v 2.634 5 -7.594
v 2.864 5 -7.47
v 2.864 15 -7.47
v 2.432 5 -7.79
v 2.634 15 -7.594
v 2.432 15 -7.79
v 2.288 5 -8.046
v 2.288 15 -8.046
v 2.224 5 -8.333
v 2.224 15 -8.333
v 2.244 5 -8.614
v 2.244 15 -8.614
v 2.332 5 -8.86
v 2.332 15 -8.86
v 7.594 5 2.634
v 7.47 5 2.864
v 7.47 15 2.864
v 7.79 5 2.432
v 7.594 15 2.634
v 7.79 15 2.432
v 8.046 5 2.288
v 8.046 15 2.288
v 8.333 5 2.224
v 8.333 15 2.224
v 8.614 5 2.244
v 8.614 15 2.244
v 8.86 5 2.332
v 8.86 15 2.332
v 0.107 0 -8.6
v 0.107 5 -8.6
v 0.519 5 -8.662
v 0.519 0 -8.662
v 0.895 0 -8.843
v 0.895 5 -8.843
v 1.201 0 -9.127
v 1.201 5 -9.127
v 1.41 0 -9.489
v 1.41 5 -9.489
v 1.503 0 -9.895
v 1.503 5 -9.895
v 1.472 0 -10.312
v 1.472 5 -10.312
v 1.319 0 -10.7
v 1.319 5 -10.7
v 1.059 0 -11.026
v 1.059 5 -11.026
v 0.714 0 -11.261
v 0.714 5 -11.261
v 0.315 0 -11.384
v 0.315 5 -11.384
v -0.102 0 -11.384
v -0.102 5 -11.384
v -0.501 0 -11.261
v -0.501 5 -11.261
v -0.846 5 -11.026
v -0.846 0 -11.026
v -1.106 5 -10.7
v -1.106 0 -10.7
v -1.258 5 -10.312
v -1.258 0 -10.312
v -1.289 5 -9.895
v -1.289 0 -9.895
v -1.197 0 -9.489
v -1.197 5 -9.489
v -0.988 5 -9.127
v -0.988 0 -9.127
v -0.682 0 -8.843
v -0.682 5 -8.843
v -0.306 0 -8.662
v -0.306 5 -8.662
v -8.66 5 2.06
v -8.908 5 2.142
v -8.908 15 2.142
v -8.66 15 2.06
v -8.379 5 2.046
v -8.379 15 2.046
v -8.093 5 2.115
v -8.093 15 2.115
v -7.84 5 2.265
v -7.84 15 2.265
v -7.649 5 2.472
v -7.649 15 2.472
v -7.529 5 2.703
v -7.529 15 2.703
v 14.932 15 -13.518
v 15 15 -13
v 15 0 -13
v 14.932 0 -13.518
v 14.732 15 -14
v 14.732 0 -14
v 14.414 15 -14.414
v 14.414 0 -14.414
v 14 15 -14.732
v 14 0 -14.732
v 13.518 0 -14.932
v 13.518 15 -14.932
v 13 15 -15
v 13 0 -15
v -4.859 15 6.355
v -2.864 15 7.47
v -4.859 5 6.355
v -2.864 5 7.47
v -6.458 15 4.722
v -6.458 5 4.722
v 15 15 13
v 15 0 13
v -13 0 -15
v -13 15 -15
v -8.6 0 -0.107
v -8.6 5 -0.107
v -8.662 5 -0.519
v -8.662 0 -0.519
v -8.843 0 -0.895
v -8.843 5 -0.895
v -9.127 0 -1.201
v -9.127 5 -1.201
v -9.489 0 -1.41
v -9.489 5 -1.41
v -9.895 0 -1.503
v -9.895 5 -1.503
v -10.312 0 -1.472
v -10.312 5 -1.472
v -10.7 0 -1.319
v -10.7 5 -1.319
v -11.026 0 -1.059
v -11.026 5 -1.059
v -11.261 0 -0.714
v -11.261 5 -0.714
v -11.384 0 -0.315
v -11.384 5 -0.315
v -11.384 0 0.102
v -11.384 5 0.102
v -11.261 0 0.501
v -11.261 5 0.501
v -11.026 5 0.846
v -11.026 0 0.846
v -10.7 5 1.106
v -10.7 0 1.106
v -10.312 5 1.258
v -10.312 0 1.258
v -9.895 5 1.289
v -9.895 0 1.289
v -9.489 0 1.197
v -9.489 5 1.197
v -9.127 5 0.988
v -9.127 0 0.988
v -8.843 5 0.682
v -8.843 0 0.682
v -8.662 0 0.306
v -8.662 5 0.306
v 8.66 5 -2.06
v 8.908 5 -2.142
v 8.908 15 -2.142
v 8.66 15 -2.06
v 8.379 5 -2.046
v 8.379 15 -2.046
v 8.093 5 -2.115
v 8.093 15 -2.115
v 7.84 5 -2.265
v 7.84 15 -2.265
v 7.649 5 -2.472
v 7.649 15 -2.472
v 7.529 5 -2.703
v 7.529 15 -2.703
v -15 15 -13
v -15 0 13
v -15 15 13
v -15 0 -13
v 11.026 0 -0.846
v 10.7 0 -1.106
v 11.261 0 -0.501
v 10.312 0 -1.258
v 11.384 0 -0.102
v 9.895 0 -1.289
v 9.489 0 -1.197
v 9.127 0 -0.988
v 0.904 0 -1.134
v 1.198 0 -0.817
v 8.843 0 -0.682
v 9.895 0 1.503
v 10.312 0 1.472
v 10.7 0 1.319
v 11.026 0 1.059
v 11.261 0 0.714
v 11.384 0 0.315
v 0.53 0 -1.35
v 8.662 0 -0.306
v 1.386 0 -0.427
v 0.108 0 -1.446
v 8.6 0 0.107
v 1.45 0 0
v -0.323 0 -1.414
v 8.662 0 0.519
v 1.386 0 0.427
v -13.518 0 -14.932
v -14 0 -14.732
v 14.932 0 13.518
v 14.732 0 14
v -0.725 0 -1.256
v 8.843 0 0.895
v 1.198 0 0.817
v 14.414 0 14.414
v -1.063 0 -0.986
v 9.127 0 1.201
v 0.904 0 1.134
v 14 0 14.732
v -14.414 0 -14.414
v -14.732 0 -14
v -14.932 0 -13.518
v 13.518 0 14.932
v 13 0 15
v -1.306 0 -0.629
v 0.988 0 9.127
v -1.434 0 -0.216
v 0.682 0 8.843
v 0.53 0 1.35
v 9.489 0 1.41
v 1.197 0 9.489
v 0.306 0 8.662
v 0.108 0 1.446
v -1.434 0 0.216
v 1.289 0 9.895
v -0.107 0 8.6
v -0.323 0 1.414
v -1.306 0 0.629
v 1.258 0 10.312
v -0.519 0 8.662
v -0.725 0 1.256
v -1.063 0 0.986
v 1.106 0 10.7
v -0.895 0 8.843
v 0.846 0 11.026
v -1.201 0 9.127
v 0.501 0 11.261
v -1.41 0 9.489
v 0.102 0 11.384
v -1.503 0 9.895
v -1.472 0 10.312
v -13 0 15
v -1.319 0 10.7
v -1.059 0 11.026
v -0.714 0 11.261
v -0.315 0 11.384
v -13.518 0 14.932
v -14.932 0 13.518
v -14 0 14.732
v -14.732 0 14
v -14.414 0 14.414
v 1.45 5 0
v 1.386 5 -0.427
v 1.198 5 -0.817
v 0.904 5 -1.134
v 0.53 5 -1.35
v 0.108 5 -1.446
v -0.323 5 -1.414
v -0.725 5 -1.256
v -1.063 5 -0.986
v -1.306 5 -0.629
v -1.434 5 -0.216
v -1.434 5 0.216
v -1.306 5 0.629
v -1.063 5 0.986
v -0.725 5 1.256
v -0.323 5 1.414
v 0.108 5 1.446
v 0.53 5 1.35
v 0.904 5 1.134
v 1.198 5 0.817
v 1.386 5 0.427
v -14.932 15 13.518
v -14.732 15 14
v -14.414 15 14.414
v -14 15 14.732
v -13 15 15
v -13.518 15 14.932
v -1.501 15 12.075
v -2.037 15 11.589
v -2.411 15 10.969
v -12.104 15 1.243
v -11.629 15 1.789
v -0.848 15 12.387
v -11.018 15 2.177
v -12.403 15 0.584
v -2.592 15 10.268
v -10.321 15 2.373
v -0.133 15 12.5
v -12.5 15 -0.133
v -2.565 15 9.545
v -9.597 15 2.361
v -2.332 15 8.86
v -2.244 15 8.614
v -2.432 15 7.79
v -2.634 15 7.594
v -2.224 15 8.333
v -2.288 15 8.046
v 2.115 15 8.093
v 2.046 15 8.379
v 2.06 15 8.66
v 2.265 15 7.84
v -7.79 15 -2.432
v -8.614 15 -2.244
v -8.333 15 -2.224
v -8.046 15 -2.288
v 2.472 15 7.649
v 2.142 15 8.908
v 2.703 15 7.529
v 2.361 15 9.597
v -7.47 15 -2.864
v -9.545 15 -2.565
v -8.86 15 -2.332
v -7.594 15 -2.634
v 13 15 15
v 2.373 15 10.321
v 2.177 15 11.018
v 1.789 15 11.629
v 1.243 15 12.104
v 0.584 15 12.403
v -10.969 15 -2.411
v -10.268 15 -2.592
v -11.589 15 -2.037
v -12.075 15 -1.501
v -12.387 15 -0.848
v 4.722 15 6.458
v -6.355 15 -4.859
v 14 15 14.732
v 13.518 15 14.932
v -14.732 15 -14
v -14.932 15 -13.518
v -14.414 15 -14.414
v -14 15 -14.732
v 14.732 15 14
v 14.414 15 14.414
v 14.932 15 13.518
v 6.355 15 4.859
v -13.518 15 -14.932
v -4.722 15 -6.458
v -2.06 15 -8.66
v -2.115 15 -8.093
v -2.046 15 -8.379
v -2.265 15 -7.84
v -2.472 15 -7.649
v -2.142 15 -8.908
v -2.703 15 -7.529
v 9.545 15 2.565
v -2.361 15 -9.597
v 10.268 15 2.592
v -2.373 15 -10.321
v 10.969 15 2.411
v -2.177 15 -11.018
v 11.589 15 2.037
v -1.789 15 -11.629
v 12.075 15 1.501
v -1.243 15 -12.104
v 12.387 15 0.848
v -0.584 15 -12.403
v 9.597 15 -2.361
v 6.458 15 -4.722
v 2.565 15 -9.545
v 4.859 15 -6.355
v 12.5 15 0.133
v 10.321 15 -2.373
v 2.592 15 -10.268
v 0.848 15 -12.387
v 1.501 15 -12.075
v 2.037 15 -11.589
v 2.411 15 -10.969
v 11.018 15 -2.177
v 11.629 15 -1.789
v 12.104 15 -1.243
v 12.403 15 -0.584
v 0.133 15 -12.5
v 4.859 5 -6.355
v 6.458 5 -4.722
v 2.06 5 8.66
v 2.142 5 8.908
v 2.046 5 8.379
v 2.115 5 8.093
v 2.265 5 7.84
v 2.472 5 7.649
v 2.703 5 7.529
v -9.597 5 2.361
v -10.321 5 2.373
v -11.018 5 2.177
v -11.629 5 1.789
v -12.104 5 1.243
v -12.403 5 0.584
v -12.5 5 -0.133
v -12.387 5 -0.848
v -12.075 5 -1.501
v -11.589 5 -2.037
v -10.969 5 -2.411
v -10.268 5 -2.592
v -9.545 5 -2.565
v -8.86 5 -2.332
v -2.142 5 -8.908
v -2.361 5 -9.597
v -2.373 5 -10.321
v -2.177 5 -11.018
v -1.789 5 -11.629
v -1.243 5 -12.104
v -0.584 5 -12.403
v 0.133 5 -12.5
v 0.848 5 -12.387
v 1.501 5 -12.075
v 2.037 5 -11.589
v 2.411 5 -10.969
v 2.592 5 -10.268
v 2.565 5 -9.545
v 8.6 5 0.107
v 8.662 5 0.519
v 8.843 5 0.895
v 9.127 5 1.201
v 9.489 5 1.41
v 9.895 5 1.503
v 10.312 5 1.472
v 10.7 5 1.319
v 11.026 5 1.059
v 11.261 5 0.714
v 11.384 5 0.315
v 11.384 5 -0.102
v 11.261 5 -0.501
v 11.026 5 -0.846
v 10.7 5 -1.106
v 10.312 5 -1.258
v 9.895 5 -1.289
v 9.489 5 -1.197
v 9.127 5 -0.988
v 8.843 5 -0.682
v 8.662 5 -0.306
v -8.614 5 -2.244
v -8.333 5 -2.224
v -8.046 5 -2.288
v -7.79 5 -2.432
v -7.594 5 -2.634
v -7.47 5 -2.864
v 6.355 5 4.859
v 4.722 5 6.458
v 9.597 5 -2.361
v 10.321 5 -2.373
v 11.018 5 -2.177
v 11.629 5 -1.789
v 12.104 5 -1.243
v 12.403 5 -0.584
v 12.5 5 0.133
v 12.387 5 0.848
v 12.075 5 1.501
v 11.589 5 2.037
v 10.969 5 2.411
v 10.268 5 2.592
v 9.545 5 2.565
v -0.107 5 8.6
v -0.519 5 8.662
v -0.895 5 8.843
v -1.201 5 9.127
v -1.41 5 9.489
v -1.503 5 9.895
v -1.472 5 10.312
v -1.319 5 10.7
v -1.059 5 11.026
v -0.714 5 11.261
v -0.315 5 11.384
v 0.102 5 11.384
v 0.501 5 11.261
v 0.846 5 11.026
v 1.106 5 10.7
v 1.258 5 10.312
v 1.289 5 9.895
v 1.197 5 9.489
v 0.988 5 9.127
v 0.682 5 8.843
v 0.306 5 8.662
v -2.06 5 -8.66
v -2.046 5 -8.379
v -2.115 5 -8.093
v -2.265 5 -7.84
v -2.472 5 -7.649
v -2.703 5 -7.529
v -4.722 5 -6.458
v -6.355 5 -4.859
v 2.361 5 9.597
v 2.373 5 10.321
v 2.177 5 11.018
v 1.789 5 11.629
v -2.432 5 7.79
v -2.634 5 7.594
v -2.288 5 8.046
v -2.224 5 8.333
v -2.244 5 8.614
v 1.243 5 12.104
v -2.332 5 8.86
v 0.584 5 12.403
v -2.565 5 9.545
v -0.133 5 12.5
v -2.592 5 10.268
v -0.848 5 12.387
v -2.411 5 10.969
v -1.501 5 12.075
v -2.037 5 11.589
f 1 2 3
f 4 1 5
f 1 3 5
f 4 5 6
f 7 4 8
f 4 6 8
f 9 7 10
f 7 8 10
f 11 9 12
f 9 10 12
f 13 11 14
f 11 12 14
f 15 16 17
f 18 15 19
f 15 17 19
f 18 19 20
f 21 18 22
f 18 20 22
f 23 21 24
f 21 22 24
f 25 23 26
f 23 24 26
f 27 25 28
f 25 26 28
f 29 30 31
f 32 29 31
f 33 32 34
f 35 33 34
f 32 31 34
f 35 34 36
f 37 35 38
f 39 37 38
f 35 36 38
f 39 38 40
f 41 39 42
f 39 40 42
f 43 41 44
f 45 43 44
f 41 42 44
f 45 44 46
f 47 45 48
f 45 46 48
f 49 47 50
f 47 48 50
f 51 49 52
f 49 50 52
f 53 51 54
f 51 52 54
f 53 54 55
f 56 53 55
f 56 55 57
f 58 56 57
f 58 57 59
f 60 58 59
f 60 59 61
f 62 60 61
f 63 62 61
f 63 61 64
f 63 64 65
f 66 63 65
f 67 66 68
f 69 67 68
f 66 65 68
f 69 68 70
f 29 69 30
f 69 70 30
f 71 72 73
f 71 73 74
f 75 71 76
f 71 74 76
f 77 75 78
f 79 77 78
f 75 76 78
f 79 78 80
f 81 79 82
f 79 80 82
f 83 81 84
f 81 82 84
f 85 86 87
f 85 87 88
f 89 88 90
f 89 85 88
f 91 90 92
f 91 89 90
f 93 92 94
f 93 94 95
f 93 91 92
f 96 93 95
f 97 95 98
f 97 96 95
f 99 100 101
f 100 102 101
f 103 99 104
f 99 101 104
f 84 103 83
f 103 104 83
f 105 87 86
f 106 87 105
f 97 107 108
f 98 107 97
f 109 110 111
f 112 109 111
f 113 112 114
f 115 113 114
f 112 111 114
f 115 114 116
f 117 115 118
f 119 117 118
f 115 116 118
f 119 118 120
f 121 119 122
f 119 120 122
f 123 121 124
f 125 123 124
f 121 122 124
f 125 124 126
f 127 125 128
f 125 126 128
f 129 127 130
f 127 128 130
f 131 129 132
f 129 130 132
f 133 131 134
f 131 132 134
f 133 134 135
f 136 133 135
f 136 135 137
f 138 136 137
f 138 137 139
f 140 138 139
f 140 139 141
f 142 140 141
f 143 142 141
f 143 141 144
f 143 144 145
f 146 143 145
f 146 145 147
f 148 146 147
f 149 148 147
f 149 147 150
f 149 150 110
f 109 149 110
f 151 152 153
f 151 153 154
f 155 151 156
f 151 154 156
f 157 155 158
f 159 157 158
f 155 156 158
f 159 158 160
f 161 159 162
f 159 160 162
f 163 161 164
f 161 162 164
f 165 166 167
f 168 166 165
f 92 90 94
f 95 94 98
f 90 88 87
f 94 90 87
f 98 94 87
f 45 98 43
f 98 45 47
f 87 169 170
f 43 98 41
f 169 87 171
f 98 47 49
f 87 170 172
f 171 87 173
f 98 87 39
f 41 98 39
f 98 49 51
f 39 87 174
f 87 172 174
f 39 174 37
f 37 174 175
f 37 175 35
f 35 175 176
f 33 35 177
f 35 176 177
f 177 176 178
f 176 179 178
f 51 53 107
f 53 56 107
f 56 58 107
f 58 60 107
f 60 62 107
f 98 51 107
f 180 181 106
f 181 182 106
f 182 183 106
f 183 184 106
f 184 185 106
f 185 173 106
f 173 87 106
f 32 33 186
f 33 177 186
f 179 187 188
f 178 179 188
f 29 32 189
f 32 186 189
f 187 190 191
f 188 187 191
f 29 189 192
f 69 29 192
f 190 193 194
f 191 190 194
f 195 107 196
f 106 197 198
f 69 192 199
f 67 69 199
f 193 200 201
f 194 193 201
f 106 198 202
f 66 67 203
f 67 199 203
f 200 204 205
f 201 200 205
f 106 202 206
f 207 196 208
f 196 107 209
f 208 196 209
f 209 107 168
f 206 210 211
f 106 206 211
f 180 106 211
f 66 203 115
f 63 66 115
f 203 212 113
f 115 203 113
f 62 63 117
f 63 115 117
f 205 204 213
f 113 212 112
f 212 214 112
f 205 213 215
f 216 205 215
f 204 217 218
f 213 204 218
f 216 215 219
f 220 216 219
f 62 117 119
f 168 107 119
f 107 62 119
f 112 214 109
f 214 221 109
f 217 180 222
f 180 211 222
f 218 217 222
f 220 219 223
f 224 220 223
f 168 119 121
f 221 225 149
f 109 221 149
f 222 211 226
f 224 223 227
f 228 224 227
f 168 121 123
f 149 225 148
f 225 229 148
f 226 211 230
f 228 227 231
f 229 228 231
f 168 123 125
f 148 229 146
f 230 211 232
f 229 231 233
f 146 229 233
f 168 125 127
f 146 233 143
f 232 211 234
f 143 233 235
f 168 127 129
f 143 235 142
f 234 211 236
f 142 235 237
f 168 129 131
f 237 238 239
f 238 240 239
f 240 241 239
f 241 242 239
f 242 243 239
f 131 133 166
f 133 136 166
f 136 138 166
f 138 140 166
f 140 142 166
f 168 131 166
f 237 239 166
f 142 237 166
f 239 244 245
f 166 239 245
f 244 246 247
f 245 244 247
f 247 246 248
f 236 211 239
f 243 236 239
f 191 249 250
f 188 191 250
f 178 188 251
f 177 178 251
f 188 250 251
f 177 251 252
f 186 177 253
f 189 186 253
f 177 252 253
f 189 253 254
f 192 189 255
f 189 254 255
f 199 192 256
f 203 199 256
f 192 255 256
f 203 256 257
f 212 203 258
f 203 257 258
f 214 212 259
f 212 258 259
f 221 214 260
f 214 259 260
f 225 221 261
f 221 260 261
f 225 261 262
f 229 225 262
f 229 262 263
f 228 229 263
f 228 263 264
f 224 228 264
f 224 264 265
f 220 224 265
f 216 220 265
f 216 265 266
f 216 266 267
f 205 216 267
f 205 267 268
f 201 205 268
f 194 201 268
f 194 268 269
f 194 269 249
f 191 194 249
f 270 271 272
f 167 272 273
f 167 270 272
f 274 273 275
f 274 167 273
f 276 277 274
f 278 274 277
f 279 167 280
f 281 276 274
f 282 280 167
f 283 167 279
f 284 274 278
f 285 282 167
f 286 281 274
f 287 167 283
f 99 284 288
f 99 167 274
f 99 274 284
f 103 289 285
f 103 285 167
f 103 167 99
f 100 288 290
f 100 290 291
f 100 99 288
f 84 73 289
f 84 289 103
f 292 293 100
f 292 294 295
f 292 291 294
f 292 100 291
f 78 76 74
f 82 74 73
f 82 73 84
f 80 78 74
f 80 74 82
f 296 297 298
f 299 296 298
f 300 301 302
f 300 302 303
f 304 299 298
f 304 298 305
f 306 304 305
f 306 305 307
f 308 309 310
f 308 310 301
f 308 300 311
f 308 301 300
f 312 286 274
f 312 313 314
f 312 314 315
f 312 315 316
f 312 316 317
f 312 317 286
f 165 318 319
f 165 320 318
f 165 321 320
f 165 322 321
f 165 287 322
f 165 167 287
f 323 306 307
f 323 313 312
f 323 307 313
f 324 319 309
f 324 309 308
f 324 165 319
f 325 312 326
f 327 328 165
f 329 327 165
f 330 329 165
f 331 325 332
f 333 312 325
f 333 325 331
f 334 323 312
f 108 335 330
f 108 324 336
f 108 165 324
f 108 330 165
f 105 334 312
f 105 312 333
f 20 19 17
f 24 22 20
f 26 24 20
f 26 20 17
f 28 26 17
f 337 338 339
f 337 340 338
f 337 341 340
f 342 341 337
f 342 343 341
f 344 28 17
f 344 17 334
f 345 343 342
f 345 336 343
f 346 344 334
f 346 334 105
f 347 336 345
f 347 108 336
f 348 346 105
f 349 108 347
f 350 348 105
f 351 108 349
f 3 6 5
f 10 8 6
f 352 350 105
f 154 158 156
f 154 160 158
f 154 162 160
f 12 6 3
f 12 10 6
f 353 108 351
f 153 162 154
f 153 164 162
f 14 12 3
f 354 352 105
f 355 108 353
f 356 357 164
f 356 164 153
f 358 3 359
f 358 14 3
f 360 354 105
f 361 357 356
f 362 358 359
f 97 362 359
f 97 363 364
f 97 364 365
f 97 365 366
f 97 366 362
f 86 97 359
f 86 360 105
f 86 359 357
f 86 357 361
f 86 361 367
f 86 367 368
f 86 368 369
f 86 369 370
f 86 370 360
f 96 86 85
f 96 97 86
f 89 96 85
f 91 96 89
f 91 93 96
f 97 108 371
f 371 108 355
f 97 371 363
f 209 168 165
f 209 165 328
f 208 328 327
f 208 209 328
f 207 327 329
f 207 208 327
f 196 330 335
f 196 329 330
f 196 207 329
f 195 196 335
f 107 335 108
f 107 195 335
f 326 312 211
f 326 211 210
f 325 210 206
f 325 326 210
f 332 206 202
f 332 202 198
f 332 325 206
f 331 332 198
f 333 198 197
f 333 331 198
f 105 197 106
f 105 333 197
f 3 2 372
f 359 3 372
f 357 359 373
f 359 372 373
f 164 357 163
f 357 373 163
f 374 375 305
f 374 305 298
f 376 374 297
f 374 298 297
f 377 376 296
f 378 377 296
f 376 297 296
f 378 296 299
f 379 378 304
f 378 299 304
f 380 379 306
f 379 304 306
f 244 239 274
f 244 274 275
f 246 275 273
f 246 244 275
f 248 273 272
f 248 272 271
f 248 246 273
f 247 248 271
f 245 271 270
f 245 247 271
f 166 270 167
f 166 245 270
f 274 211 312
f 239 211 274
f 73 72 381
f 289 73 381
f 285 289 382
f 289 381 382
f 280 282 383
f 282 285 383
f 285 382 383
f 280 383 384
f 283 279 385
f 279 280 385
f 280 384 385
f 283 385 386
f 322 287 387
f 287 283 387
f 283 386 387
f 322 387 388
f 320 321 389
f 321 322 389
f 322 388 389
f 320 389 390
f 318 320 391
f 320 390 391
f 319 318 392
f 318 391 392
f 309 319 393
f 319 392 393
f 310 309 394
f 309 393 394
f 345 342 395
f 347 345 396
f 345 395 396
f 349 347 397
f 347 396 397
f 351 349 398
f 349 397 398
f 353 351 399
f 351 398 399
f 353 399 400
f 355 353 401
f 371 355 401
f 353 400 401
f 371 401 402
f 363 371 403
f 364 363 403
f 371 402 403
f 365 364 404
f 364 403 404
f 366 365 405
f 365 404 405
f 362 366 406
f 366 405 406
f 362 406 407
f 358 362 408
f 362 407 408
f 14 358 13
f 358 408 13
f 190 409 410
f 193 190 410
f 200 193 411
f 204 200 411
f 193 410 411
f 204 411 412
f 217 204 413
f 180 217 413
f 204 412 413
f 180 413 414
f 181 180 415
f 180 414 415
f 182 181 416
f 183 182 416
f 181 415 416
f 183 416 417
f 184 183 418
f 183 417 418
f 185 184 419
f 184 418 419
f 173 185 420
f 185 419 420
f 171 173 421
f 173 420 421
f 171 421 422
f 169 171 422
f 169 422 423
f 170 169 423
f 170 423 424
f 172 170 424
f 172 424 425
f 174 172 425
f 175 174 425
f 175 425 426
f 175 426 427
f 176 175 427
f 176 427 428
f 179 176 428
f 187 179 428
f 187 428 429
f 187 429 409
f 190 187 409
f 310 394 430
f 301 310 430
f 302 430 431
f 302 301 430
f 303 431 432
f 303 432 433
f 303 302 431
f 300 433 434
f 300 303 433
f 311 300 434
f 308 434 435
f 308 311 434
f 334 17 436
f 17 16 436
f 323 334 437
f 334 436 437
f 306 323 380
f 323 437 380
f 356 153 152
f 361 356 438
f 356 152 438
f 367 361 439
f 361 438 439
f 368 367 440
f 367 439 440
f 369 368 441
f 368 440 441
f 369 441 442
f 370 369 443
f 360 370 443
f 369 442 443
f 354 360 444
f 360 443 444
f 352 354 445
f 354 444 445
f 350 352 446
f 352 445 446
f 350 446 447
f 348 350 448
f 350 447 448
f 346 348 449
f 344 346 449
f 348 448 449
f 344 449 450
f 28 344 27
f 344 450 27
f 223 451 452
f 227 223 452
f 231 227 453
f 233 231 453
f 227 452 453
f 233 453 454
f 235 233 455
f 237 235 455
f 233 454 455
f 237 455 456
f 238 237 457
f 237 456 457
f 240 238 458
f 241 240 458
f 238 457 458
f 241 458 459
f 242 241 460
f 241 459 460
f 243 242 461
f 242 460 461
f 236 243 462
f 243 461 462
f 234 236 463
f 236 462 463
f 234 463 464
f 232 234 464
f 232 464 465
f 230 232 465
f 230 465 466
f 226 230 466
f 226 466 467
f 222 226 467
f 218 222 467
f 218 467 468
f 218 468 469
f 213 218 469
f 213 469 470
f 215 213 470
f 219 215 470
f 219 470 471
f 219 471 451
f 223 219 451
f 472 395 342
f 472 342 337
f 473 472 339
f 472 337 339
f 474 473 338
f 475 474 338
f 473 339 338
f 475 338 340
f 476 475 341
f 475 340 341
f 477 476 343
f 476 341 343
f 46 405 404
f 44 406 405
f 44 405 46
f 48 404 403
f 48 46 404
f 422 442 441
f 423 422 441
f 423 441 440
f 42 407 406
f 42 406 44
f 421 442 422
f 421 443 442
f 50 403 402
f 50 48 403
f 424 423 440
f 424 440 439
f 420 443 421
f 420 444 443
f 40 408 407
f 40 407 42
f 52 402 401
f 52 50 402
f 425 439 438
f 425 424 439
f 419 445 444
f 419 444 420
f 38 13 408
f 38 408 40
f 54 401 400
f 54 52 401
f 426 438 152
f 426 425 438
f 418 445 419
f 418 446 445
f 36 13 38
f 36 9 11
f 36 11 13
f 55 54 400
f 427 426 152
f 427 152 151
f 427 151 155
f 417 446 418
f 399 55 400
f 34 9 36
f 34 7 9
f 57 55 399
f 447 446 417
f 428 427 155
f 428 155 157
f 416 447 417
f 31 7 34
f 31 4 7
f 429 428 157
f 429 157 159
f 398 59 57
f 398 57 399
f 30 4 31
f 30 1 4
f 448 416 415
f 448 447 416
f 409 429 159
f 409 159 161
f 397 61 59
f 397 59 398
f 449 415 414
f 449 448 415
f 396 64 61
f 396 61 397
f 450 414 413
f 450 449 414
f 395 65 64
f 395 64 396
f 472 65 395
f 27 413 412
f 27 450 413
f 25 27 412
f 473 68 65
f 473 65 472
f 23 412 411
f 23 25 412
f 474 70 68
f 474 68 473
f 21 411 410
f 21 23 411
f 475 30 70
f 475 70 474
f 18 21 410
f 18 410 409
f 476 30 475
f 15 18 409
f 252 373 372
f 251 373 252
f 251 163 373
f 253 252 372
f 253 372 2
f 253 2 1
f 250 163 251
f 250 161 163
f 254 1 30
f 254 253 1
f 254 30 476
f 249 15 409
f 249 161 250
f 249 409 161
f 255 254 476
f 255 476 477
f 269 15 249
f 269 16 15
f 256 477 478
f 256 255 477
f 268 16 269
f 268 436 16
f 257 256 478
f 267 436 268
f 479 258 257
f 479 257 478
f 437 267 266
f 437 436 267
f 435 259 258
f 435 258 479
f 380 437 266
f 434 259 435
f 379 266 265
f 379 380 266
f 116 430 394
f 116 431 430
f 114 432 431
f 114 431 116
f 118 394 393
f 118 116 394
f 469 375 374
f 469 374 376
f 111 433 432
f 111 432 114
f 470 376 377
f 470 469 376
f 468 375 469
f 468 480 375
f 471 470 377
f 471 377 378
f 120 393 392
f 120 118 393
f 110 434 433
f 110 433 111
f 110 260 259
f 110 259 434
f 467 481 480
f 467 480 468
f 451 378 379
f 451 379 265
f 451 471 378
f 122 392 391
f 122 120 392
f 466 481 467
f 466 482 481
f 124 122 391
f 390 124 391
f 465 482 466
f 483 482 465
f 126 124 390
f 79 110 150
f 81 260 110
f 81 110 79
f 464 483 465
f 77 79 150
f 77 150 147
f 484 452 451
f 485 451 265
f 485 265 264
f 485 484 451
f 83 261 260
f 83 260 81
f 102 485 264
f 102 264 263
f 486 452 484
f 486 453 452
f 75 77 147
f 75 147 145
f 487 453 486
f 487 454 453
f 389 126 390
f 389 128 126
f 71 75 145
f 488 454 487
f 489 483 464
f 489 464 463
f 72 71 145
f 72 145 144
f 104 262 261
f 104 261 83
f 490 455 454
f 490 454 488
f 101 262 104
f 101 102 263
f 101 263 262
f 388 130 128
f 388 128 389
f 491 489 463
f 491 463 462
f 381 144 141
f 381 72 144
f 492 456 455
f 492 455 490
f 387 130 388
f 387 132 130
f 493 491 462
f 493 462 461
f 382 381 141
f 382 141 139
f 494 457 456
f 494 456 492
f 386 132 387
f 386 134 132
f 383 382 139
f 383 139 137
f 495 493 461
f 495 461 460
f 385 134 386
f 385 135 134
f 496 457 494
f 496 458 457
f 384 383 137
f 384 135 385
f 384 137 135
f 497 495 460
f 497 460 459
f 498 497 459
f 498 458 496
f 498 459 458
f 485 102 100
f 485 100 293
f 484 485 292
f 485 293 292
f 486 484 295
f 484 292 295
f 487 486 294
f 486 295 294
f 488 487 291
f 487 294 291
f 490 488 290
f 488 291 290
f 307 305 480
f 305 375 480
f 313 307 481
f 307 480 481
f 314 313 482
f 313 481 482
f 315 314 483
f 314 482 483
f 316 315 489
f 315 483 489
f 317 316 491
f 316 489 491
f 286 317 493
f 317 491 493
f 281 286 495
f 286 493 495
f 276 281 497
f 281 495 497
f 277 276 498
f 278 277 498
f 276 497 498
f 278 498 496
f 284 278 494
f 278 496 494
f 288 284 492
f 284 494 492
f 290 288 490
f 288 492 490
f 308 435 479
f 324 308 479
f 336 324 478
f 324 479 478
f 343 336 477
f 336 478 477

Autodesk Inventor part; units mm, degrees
ref_plane "YZ Plane" through (0, 0, 0) normal (1, 0, 0) x (0, 1, 0)
ref_plane "XZ Plane" through (0, 0, 0) normal (0, 1, 0) x (-1, 0, 0)
ref_plane "XY Plane" through (0, 0, 0) normal (0, 0, 1) x (1, 0, 0)
sketch "Sketch1" plane through (0, 0, 0) normal (0, 1, 0) x (-1, 0, 0)
  line L0 (-15, 15) -> (15, 15)
  line L1 (15, 15) -> (15, -15)
  line L2 (15, -15) -> (-15, -15)
  line L3 (-15, -15) -> (-15, 15)
  line L4 (-15, 15) -> (15, -15) construction
  line L5 (15, 15) -> (-15, -15) construction
  point P0 (0, 0)
  dimension "d0" = 30
  dimension "d1" = 30
extrude "Extrusion1" add sketch "Sketch1" along normal blind 5
sketch "Sketch2" plane through (0, 5, 0) normal (0, 1, 0) x (1, 0, 0)
  circle A0 centre (0, 0) radius 7
  dimension "d4" = 14
extrude "Extrusion2" add sketch "Sketch2" along normal blind 10
sketch "Sketch3" plane through (0, 5, 0) normal (0, 1, 0) x (1, 0, 0)
  line L0 (-15, -15) -> (15, -15) projected
  line L1 (0, -15) -> (0, 15) construction
  line L2 (15, 15) -> (-15, 15) projected
  line L3 (0, 0.1067) -> (-10, 0.1067) construction
  circle A0 centre (-10, 0.1067) radius 1.4
  point P0 (0, 0)
  point P1 (0, 0)
  dimension "d7" = 2.8
  dimension "d8" = 10
extrude "Extrusion3" add sketch "Sketch3" along normal blind 10
pattern_circular "Circular Pattern1" count 4 over 360 about axis through (0, 5, 0) along (0, 1, 0) of "Extrusion3"
sketch "Sketch4" plane through (0, 5, 0) normal (0, 1, 0) x (1, 0, 0)
  circle A0 centre (-10, 0.1067) radius 1.4 projected
  circle A1 centre (-10, 0.1067) radius 2.5
  circle A2 centre (0.1067, 10) radius 1.4 projected
  circle A3 centre (0.1067, 10) radius 2.5
  circle A4 centre (-0.1067, -10) radius 1.4 projected
  circle A5 centre (-0.1067, -10) radius 2.5
  circle A6 centre (10, -0.1067) radius 1.4 projected
  circle A7 centre (10, -0.1067) radius 2.5
  circle A8 centre (0, 0) radius 7 projected
  circle A9 centre (0, 0) radius 8
  line L0 (15, -15) -> (-15, -15)
  line L1 (-15, -15) -> (-15, 15)
  line L2 (-15, 15) -> (15, 15)
  line L3 (15, 15) -> (15, -15)
  line L4 (15, -15) -> (-15, 15) construction
  line L5 (-15, -15) -> (15, 15) construction
  point P0 (7.8729, -1.4203)
  point P1 (1.2519, -7.9014)
  point P2 (-1.4203, -7.8729)
  point P3 (-7.9014, -1.2519)
  point P4 (-7.8729, 1.4203)
  point P5 (-1.2519, 7.9014)
  point P6 (1.4203, 7.8729)
  point P7 (7.9014, 1.2519)
  dimension "d14" = 5
  dimension "d15" = 5
  dimension "d16" = 5
  dimension "d17" = 5
  dimension "d18" = 16
extrude "Extrusion4" add sketch "Sketch4" along normal up to surface (10 mm away) contours L0 L1 L2 L3
fillet "Fillet1" radius 1 8 edges at (-1.2519, 10, -7.9014) (-7.8729, 10, -1.4203) (-7.9014, 10, 1.2519) (-1.4203, 10, 7.8729) (1.2519, 10, 7.9014) (7.8729, 10, 1.4203) (7.9014, 10, -1.2519) (1.4203, 10, -7.8729)
fillet "Fillet2" radius 2 4 edges at (15, 7.5, 15) (15, 7.5, -15) (-15, 7.5, 15) (-15, 7.5, -15)
sketch "Sketch5" plane through (-10, 15, -0.1067) normal (0, 1, 0) x (1, 0, 0)
  circle A0 centre (0, 0) radius 1.4
  circle A1 centre (0, 0) radius 1.4 projected
  point P0 (10, -0.1067)
extrude "Extrusion5" cut sketch "Sketch5" against normal blind 20.5
pattern_circular "Circular Pattern2" count 4 over 360 about axis through (0, 5, 0) along (0, 1, 0) of "Extrusion5"
sketch "Sketch6" plane through (0, 15, 0) normal (0, 1, 0) x (1, 0, 0)
  circle A0 centre (0, 0) radius 7
  dimension "d28" = 14
extrude "Extrusion6" cut sketch "Sketch6" against normal up to surface (10 mm away)
sketch "Sketch7" plane through (0, 5, 0) normal (0, 1, 0) x (1, 0, 0)
  circle A0 centre (0, 0) radius 1.45
  dimension "d31" = 2.9
extrude "Extrusion7" cut sketch "Sketch7" against normal blind 10
equation "\"d1\" = d0"
equation "\"d15\" = d14"
equation "\"d16\" = d14"
equation "\"d17\" = d14"
properties part number "PDMS stretcher mould divided in parts"
